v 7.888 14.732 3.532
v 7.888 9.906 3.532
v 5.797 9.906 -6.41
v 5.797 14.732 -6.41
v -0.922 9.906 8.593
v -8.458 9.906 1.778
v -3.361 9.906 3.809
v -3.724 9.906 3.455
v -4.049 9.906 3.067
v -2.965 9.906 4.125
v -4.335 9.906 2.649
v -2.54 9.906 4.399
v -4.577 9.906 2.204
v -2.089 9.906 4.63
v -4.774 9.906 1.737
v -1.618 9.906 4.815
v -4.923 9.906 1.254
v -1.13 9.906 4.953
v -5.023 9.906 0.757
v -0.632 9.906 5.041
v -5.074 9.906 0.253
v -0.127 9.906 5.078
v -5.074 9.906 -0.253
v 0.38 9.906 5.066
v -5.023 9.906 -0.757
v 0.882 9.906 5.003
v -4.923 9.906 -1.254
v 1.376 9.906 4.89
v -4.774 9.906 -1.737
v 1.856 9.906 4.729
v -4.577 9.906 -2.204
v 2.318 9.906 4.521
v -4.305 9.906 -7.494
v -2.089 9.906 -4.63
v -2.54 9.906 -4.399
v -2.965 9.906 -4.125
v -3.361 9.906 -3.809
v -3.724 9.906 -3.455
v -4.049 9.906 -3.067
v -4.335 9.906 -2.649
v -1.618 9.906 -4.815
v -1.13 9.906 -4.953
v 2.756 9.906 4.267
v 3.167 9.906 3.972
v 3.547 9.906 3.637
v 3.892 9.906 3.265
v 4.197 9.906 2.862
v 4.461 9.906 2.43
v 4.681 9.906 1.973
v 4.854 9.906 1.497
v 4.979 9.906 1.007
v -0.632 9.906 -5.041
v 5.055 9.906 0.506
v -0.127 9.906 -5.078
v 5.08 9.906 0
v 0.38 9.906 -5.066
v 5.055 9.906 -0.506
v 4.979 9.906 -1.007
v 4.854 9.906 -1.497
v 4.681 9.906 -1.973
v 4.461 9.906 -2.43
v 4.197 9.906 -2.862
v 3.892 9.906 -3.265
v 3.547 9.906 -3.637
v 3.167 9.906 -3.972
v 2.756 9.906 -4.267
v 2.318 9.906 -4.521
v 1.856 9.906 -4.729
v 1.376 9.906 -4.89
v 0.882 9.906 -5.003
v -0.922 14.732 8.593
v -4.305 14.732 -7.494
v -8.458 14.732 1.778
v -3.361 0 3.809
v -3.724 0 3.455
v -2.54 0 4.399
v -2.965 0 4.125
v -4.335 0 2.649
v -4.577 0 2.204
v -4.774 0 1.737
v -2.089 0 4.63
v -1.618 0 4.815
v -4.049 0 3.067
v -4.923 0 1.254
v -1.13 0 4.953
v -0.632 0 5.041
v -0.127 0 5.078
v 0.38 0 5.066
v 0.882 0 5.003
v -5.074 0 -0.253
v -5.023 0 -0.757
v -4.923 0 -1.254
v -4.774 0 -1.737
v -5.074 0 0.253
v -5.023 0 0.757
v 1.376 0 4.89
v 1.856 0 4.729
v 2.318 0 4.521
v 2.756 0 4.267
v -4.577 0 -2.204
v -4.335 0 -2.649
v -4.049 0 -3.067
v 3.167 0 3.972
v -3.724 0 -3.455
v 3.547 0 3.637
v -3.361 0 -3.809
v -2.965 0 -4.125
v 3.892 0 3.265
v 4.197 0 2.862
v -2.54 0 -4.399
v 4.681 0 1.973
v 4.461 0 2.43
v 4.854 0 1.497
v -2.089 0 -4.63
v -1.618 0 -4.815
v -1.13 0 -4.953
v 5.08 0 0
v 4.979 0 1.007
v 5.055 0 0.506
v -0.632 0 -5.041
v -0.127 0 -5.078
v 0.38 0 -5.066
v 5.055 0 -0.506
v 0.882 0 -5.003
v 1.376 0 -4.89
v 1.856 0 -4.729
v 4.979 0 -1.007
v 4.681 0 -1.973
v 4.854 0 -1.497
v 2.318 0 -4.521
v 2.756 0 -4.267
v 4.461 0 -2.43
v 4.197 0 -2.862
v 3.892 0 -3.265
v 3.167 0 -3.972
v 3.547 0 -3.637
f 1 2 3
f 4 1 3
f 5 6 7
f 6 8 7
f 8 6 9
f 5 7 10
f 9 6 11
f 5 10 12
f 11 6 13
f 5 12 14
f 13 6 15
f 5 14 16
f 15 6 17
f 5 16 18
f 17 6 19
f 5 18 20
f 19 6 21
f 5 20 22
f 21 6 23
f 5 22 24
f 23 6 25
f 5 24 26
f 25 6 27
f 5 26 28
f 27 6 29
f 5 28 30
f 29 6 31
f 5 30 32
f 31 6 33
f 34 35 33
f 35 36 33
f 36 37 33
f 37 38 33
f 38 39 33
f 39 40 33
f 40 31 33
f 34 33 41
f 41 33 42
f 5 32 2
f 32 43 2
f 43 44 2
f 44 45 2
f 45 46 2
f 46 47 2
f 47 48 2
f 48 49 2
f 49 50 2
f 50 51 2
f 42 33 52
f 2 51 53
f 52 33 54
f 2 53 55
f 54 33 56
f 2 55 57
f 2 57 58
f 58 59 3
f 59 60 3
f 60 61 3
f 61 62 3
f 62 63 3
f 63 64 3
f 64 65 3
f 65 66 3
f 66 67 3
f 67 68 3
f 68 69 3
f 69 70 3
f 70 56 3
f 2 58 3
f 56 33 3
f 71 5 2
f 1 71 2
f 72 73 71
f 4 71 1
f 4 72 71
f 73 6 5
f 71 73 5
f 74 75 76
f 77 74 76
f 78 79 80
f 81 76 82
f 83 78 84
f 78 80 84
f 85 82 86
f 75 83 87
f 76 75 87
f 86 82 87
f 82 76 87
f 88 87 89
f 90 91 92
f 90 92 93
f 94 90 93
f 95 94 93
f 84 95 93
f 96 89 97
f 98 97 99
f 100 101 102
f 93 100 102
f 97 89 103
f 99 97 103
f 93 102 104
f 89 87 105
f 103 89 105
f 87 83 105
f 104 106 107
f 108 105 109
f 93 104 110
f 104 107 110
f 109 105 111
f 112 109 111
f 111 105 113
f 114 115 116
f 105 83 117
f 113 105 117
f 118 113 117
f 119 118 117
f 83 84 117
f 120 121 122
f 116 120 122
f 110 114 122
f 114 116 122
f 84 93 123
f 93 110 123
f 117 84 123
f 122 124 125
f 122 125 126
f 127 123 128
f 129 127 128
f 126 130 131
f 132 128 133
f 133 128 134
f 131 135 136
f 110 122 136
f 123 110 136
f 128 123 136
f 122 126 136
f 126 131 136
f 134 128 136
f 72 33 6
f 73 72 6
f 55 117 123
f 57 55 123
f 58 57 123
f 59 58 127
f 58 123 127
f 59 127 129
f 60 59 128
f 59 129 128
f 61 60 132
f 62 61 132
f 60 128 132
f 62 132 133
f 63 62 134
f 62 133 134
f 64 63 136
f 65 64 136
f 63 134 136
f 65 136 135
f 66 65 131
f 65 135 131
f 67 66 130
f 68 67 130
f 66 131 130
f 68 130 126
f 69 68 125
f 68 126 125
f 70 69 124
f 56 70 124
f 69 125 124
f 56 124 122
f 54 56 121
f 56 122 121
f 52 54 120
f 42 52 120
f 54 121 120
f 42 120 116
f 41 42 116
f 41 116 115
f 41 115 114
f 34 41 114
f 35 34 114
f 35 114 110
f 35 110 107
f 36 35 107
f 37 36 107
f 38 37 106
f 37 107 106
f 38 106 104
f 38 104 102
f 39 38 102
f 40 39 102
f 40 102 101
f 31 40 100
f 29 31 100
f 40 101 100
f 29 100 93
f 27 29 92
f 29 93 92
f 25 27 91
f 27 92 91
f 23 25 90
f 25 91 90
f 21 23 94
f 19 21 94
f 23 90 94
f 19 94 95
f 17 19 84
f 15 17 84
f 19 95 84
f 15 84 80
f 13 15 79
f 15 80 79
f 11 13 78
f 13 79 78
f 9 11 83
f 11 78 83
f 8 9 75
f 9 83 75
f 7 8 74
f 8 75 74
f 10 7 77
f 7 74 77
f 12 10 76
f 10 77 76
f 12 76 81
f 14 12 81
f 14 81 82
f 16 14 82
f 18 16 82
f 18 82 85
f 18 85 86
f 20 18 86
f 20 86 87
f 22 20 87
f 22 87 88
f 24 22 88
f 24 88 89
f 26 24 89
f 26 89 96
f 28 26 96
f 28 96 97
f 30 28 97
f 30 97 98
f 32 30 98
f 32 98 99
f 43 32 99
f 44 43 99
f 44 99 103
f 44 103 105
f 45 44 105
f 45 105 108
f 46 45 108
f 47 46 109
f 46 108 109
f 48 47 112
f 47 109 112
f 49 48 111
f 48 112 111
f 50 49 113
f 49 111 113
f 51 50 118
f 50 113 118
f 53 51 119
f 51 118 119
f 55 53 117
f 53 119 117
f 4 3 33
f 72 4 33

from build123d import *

# Parameters (mm, degrees)
SKETCH1_R           = 5.08
BOSS_EXTRUDE1_DEPTH = 9.906
BOSS_EXTRUDE2_DEPTH = 4.826


with BuildPart() as part:
    # Sketch1 → Boss-Extrude1 (new body)
    with BuildSketch(Plane(origin=(0, 0, 0), x_dir=(1, 0, 0), z_dir=(0, 1, 0))):
        Circle(SKETCH1_R)
    extrude(amount=BOSS_EXTRUDE1_DEPTH)

    # Sketch2 → Boss-Extrude2 (add)
    with BuildSketch(Plane(origin=(0, 9.906, 0), x_dir=(1, 0, 0), z_dir=(0, 1, 0))):
        Polygon((7.887747477, -3.532447537), (5.797005266, 6.410107316), (-4.305001189, 7.49411173), (-8.457642323, -1.778491551), (-0.922109231, -8.593279957), align=None)
    extrude(amount=BOSS_EXTRUDE2_DEPTH)


solid = part.part
